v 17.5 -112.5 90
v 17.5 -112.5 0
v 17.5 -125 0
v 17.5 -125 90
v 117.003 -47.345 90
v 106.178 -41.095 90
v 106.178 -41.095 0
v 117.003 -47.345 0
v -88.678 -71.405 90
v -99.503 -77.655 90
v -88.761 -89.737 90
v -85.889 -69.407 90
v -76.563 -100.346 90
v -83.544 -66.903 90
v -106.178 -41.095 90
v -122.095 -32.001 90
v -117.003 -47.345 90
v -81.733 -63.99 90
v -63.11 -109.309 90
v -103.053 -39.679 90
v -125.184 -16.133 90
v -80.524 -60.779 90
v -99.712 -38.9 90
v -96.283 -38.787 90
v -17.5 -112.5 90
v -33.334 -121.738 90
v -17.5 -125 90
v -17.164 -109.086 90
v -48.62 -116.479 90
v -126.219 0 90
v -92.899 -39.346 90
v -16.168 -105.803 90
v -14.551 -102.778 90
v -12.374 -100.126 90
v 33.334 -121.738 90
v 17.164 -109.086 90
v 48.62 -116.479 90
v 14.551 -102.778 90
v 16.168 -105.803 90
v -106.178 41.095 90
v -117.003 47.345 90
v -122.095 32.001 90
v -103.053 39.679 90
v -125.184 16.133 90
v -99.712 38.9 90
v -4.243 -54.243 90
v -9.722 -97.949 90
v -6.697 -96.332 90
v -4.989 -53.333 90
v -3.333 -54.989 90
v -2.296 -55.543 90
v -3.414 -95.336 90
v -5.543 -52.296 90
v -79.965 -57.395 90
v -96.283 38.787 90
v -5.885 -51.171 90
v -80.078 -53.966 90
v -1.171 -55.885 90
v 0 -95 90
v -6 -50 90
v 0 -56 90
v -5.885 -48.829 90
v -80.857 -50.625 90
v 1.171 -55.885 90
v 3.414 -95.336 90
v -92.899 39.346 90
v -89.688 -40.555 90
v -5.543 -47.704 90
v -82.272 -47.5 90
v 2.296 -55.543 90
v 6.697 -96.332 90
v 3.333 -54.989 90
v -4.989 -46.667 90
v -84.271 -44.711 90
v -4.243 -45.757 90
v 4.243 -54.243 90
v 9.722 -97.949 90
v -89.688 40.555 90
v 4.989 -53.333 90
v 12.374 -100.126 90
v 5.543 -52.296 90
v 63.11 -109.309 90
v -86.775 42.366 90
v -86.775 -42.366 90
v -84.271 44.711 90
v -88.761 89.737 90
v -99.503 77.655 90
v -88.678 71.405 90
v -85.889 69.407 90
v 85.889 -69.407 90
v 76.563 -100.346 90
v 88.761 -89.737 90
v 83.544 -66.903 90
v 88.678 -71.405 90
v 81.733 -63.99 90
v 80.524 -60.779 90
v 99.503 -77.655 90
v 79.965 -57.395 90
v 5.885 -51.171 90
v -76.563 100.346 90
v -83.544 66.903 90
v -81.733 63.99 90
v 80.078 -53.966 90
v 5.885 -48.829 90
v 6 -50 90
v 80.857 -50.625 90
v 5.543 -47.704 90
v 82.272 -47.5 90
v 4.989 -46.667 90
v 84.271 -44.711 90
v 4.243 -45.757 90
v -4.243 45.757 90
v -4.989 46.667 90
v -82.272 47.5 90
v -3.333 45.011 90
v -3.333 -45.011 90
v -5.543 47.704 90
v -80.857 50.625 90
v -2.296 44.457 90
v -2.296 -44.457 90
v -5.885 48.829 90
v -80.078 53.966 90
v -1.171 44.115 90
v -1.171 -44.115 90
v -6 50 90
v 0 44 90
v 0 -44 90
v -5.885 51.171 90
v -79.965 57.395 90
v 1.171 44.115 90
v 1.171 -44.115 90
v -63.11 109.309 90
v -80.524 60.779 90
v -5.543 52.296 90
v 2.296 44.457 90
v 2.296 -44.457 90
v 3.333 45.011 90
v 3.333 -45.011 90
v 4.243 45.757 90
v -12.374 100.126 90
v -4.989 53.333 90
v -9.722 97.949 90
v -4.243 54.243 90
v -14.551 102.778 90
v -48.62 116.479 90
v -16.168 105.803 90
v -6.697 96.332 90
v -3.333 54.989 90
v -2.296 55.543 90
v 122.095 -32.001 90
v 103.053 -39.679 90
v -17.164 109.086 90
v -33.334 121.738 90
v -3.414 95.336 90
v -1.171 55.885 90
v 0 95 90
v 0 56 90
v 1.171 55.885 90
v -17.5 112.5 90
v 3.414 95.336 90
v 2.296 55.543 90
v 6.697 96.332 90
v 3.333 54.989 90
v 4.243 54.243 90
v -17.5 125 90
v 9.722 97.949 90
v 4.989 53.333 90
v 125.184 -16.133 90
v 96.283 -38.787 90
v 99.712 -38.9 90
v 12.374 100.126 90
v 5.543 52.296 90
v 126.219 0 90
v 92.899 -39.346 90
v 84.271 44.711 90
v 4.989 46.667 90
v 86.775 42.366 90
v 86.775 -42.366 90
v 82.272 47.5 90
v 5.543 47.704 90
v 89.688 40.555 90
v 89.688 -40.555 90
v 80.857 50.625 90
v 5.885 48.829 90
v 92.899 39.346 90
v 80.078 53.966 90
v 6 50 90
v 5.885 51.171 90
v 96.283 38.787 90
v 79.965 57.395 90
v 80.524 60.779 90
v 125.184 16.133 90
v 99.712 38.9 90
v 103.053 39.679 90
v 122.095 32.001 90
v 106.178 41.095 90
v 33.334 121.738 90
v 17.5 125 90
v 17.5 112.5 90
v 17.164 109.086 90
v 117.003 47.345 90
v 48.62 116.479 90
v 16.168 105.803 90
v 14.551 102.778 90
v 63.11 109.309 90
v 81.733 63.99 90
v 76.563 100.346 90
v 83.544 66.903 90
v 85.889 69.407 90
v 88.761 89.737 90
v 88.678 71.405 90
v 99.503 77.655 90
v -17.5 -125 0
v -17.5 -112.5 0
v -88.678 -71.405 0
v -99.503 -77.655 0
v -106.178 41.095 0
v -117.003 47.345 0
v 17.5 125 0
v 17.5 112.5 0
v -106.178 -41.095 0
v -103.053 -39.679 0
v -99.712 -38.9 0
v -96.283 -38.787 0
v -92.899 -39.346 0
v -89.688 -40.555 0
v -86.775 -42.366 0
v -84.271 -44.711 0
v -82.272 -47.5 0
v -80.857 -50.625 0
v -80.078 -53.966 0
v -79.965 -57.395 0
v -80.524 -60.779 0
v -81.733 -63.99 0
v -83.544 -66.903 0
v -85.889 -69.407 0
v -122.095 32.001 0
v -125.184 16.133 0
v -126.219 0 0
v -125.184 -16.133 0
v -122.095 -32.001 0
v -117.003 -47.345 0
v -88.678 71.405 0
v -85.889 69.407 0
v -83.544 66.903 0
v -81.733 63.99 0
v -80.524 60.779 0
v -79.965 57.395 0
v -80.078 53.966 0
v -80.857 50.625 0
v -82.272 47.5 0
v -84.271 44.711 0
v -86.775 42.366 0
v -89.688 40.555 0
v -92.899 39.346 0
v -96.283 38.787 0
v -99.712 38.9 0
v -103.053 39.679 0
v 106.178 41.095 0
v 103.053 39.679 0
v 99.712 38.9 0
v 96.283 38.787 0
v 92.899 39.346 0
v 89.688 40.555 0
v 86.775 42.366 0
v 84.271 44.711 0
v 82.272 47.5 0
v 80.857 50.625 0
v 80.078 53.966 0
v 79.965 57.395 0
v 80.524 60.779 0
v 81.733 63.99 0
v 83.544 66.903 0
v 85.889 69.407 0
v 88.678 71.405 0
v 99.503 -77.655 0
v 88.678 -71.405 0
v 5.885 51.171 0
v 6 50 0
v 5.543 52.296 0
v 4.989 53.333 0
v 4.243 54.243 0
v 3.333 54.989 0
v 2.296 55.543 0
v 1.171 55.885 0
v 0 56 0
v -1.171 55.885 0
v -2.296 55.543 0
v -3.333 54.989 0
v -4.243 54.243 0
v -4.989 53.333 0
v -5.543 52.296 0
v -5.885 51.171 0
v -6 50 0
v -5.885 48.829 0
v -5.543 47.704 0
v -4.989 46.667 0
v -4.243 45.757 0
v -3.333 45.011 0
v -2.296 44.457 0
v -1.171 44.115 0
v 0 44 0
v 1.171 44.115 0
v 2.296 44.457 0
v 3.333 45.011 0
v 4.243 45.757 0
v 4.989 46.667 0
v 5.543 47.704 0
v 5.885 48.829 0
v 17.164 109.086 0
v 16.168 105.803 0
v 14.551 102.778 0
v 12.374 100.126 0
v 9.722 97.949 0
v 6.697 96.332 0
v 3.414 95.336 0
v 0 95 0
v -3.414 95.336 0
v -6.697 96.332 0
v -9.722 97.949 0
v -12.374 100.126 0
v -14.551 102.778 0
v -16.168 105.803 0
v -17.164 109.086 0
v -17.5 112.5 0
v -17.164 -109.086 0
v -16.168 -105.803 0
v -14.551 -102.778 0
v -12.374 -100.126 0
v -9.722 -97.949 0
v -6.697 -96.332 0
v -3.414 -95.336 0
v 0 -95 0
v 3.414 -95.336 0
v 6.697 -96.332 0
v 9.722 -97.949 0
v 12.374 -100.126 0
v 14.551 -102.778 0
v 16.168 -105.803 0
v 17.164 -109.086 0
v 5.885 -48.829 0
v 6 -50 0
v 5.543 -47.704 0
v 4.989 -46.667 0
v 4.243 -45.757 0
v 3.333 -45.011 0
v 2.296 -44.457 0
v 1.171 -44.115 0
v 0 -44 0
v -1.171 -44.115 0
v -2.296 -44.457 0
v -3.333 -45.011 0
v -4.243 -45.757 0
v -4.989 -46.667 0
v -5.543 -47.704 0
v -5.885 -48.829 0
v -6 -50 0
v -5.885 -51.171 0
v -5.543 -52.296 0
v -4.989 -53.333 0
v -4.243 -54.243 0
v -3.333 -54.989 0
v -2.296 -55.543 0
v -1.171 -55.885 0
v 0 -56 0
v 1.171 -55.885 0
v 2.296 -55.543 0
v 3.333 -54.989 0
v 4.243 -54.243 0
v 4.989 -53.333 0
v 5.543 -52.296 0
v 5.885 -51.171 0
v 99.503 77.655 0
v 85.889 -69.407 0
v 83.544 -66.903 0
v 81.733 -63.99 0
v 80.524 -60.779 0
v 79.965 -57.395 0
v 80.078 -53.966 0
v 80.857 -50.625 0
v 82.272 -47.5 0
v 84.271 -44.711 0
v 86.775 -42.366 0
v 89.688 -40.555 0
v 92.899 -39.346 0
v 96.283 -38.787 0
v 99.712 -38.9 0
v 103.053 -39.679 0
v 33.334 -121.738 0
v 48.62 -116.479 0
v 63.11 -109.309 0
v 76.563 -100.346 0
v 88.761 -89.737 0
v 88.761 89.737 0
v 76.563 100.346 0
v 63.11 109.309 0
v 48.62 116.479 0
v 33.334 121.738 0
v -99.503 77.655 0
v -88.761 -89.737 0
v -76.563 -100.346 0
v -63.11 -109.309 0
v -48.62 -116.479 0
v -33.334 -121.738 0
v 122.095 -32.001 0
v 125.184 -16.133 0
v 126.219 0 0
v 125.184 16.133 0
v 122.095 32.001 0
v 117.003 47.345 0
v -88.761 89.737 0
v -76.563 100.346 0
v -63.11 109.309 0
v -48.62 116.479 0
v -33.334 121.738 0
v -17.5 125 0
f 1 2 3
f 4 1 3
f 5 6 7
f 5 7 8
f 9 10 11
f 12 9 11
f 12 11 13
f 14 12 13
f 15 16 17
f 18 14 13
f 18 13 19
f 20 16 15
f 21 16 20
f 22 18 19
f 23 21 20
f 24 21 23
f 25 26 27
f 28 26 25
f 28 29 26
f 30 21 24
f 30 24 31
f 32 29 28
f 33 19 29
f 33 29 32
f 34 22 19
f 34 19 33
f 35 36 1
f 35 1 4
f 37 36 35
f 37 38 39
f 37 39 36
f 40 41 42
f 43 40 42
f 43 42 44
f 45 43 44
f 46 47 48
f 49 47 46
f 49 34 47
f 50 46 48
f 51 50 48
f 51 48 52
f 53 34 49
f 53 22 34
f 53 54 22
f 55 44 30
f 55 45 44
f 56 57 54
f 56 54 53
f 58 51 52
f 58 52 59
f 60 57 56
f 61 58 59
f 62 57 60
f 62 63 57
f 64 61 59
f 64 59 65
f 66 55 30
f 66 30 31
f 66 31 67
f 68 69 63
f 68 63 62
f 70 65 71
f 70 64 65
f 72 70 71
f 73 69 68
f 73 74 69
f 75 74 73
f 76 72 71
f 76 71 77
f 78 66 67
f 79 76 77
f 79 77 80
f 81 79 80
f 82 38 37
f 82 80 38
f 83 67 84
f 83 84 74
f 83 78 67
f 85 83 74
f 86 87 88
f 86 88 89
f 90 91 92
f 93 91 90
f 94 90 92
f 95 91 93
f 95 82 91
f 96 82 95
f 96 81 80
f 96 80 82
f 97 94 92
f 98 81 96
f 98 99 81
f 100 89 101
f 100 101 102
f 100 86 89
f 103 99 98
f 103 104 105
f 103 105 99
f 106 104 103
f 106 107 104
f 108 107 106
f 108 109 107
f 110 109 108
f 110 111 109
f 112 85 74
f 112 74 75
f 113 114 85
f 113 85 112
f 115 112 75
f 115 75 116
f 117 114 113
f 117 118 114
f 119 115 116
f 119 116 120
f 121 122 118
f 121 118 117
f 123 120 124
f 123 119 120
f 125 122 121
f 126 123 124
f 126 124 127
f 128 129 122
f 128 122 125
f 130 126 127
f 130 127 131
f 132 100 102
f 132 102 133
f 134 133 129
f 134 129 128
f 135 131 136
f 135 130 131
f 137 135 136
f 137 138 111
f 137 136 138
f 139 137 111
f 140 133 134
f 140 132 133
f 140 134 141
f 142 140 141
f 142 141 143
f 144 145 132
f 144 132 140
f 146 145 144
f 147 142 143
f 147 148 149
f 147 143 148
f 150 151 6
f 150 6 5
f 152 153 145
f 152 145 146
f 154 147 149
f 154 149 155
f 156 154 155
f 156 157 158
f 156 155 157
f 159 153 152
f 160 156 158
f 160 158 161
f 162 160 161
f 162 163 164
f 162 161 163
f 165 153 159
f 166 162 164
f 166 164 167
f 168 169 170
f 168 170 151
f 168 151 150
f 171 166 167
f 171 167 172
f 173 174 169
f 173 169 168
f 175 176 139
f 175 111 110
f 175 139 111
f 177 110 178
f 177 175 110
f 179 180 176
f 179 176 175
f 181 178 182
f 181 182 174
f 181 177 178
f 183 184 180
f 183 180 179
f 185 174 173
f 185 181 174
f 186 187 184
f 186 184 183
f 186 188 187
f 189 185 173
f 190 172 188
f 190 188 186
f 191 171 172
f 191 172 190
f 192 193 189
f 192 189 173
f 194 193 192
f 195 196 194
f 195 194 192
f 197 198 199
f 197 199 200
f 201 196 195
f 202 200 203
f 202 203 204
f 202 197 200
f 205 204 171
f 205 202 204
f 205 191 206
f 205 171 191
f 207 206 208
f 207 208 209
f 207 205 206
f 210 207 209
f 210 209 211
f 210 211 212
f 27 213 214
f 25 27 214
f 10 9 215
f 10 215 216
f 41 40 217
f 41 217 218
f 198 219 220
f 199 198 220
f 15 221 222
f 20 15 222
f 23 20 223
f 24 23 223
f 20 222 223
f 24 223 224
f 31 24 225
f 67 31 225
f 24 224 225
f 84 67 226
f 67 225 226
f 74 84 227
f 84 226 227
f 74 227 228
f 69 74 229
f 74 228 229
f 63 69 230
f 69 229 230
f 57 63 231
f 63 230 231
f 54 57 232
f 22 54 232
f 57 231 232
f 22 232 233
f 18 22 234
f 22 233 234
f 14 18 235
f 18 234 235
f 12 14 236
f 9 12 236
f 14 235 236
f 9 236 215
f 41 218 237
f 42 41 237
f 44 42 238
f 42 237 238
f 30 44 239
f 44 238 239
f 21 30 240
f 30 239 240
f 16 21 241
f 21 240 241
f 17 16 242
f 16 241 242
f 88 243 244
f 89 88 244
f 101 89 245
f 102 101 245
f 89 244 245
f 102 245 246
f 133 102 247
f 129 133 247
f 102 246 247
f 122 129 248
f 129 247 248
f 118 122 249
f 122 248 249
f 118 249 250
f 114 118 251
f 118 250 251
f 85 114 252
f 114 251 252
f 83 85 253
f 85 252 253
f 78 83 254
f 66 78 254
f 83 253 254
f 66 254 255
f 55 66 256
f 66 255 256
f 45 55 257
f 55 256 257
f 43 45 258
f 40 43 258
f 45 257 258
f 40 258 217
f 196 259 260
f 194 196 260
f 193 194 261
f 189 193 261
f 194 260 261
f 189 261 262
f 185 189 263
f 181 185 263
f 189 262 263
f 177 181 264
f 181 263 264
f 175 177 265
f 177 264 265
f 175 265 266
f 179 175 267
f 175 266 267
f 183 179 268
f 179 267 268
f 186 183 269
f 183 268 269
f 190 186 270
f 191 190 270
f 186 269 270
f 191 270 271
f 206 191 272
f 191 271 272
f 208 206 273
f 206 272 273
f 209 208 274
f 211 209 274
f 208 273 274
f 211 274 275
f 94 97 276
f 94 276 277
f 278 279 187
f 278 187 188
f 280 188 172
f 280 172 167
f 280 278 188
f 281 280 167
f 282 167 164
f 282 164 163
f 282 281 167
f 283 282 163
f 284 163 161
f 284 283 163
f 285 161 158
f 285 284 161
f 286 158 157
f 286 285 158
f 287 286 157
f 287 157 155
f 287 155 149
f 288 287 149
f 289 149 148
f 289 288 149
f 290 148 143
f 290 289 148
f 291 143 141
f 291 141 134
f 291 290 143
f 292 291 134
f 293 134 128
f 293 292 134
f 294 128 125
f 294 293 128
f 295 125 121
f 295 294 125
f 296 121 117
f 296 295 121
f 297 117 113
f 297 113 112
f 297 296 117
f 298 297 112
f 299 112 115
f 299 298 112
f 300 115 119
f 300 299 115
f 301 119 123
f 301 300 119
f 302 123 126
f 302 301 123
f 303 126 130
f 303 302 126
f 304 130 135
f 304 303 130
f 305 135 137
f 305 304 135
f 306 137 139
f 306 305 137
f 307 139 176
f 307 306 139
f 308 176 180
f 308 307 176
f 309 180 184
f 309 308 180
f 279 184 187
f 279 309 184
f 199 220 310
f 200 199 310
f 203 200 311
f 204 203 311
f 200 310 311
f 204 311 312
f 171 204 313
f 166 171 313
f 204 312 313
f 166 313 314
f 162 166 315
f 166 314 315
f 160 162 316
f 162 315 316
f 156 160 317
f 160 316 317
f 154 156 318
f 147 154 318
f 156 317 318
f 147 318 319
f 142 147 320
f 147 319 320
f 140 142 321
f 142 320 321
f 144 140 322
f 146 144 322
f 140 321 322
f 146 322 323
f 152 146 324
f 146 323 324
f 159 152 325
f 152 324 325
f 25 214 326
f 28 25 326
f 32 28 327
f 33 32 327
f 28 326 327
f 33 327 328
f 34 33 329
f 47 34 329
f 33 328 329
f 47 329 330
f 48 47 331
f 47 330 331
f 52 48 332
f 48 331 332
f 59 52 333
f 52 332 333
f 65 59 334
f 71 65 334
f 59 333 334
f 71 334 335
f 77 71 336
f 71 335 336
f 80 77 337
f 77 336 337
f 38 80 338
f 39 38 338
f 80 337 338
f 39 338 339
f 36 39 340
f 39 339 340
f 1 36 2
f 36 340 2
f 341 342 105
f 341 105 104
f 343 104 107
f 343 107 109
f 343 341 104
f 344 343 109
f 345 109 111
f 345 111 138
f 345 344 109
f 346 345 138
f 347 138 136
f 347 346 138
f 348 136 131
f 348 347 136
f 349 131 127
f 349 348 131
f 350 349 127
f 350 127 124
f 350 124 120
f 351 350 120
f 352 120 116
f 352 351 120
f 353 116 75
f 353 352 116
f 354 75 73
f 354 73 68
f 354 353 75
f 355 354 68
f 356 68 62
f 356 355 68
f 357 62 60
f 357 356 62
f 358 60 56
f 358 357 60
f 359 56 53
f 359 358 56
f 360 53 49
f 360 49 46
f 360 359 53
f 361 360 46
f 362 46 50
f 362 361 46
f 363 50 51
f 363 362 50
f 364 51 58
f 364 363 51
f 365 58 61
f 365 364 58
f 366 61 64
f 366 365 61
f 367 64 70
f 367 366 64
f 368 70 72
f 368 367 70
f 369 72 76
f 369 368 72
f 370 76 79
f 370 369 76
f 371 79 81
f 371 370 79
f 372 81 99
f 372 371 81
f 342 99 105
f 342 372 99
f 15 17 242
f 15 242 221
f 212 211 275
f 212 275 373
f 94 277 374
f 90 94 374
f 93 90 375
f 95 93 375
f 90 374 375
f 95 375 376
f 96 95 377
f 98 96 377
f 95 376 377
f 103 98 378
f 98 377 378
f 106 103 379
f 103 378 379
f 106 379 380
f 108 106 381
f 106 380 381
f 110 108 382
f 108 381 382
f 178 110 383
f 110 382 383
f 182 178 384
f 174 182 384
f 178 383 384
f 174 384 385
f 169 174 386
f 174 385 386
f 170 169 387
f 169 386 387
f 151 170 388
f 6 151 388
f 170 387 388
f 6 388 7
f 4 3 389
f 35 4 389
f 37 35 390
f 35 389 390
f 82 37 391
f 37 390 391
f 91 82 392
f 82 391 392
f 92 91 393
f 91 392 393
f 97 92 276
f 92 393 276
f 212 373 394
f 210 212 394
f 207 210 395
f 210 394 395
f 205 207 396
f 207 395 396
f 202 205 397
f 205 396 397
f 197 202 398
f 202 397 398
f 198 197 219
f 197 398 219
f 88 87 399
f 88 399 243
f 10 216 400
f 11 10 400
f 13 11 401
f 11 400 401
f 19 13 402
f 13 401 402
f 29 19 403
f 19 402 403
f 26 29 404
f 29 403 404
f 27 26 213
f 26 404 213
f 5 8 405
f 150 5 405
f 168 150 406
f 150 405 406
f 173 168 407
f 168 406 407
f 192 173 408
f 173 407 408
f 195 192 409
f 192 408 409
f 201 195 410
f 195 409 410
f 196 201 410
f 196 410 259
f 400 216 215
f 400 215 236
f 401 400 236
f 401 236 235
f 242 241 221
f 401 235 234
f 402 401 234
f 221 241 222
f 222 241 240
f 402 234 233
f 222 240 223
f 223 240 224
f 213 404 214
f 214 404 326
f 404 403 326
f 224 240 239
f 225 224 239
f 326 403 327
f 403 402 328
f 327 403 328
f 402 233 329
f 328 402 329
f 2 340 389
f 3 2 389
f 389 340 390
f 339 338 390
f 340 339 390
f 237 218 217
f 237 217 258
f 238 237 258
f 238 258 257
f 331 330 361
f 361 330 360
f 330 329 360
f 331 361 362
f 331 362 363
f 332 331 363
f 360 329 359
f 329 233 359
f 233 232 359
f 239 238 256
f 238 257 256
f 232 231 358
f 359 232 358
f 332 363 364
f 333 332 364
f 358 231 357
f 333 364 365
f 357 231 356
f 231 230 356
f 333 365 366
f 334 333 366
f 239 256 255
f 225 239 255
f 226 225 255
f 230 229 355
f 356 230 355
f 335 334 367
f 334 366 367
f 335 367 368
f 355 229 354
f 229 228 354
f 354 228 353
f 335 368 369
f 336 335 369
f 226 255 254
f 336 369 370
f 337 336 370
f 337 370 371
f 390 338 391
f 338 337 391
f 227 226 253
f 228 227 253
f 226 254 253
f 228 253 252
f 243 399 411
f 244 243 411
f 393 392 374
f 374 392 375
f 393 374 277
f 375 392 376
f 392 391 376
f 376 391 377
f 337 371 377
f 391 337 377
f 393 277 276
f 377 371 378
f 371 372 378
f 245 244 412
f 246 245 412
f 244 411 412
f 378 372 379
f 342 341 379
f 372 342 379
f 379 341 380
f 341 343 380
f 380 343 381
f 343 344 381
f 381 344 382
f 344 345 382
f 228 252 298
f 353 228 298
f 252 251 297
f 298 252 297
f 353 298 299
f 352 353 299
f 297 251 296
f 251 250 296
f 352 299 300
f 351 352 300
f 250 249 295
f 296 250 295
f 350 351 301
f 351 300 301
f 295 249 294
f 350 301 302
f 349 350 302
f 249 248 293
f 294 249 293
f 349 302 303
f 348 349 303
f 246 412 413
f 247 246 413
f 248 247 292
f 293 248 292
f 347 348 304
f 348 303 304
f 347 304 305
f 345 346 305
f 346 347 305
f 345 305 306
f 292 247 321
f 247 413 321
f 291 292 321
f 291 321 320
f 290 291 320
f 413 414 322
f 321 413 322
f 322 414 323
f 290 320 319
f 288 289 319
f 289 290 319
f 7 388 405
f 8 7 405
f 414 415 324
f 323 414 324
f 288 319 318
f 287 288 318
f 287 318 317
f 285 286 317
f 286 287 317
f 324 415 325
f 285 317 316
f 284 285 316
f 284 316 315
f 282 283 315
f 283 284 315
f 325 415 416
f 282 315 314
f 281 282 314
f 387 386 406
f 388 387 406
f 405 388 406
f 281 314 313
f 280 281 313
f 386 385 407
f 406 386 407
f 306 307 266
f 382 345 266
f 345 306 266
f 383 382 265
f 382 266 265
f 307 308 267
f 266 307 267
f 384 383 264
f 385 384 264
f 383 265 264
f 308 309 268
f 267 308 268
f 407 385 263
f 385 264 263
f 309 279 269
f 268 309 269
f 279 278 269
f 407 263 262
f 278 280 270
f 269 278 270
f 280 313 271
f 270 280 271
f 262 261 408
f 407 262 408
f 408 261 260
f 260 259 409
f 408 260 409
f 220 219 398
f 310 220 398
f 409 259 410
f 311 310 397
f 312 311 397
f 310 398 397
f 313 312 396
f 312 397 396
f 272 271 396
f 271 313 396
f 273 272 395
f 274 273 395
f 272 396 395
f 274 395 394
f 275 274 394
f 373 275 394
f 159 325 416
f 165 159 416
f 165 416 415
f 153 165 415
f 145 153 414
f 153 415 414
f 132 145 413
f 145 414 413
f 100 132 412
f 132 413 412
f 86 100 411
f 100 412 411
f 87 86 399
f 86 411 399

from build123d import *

# Parameters (mm, degrees)
F0_R     = 6
F1_DEPTH = 90


with BuildPart() as f1:
    # F0 (on Top) → F1 (new body)
    with BuildSketch(Plane.XY):
        with BuildLine():
            Line((17.5, 125), (17.5, 112.5))
            ThreePointArc((17.5, 112.5), (0, 95), (-17.5, 112.5))
            Line((-17.5, 112.5), (-17.5, 125))
            ThreePointArc((-17.5, 125), (-63.109528, 109.308909), (-99.503175, 77.655445))
            Line((-99.503175, 77.655445), (-88.677858, 71.405445))
            ThreePointArc((-88.677858, 71.405445), (-82.272413, 47.5), (-106.177858, 41.094555))
            Line((-106.177858, 41.094555), (-117.003175, 47.344555))
            ThreePointArc((-117.003175, 47.344555), (-126.219056, 0), (-117.003175, -47.344555))
            Line((-117.003175, -47.344555), (-106.177858, -41.094555))
            ThreePointArc((-106.177858, -41.094555), (-82.272413, -47.5), (-88.677858, -71.405445))
            Line((-88.677858, -71.405445), (-99.503175, -77.655445))
            ThreePointArc((-99.503175, -77.655445), (-63.109528, -109.308909), (-17.5, -125))
            Line((-17.5, -125), (-17.5, -112.5))
            ThreePointArc((-17.5, -112.5), (0, -95), (17.5, -112.5))
            Line((17.5, -112.5), (17.5, -125))
            ThreePointArc((17.5, -125), (63.109528, -109.308909), (99.503175, -77.655445))
            Line((99.503175, -77.655445), (88.677858, -71.405445))
            ThreePointArc((88.677858, -71.405445), (82.272413, -47.5), (106.177858, -41.094555))
            Line((106.177858, -41.094555), (117.003175, -47.344555))
            ThreePointArc((117.003175, -47.344555), (126.219056, 0), (117.003175, 47.344555))
            Line((117.003175, 47.344555), (106.177858, 41.094555))
            ThreePointArc((106.177858, 41.094555), (82.272413, 47.5), (88.677858, 71.405445))
            Line((88.677858, 71.405445), (99.503175, 77.655445))
            ThreePointArc((99.503175, 77.655445), (63.109528, 109.308909), (17.5, 125))
        make_face()
        with Locations((0, -50)):
            Circle(F0_R, mode=Mode.SUBTRACT)
        with Locations((0, 50)):
            Circle(F0_R, mode=Mode.SUBTRACT)
    extrude(amount=F1_DEPTH)


solid = f1.part
